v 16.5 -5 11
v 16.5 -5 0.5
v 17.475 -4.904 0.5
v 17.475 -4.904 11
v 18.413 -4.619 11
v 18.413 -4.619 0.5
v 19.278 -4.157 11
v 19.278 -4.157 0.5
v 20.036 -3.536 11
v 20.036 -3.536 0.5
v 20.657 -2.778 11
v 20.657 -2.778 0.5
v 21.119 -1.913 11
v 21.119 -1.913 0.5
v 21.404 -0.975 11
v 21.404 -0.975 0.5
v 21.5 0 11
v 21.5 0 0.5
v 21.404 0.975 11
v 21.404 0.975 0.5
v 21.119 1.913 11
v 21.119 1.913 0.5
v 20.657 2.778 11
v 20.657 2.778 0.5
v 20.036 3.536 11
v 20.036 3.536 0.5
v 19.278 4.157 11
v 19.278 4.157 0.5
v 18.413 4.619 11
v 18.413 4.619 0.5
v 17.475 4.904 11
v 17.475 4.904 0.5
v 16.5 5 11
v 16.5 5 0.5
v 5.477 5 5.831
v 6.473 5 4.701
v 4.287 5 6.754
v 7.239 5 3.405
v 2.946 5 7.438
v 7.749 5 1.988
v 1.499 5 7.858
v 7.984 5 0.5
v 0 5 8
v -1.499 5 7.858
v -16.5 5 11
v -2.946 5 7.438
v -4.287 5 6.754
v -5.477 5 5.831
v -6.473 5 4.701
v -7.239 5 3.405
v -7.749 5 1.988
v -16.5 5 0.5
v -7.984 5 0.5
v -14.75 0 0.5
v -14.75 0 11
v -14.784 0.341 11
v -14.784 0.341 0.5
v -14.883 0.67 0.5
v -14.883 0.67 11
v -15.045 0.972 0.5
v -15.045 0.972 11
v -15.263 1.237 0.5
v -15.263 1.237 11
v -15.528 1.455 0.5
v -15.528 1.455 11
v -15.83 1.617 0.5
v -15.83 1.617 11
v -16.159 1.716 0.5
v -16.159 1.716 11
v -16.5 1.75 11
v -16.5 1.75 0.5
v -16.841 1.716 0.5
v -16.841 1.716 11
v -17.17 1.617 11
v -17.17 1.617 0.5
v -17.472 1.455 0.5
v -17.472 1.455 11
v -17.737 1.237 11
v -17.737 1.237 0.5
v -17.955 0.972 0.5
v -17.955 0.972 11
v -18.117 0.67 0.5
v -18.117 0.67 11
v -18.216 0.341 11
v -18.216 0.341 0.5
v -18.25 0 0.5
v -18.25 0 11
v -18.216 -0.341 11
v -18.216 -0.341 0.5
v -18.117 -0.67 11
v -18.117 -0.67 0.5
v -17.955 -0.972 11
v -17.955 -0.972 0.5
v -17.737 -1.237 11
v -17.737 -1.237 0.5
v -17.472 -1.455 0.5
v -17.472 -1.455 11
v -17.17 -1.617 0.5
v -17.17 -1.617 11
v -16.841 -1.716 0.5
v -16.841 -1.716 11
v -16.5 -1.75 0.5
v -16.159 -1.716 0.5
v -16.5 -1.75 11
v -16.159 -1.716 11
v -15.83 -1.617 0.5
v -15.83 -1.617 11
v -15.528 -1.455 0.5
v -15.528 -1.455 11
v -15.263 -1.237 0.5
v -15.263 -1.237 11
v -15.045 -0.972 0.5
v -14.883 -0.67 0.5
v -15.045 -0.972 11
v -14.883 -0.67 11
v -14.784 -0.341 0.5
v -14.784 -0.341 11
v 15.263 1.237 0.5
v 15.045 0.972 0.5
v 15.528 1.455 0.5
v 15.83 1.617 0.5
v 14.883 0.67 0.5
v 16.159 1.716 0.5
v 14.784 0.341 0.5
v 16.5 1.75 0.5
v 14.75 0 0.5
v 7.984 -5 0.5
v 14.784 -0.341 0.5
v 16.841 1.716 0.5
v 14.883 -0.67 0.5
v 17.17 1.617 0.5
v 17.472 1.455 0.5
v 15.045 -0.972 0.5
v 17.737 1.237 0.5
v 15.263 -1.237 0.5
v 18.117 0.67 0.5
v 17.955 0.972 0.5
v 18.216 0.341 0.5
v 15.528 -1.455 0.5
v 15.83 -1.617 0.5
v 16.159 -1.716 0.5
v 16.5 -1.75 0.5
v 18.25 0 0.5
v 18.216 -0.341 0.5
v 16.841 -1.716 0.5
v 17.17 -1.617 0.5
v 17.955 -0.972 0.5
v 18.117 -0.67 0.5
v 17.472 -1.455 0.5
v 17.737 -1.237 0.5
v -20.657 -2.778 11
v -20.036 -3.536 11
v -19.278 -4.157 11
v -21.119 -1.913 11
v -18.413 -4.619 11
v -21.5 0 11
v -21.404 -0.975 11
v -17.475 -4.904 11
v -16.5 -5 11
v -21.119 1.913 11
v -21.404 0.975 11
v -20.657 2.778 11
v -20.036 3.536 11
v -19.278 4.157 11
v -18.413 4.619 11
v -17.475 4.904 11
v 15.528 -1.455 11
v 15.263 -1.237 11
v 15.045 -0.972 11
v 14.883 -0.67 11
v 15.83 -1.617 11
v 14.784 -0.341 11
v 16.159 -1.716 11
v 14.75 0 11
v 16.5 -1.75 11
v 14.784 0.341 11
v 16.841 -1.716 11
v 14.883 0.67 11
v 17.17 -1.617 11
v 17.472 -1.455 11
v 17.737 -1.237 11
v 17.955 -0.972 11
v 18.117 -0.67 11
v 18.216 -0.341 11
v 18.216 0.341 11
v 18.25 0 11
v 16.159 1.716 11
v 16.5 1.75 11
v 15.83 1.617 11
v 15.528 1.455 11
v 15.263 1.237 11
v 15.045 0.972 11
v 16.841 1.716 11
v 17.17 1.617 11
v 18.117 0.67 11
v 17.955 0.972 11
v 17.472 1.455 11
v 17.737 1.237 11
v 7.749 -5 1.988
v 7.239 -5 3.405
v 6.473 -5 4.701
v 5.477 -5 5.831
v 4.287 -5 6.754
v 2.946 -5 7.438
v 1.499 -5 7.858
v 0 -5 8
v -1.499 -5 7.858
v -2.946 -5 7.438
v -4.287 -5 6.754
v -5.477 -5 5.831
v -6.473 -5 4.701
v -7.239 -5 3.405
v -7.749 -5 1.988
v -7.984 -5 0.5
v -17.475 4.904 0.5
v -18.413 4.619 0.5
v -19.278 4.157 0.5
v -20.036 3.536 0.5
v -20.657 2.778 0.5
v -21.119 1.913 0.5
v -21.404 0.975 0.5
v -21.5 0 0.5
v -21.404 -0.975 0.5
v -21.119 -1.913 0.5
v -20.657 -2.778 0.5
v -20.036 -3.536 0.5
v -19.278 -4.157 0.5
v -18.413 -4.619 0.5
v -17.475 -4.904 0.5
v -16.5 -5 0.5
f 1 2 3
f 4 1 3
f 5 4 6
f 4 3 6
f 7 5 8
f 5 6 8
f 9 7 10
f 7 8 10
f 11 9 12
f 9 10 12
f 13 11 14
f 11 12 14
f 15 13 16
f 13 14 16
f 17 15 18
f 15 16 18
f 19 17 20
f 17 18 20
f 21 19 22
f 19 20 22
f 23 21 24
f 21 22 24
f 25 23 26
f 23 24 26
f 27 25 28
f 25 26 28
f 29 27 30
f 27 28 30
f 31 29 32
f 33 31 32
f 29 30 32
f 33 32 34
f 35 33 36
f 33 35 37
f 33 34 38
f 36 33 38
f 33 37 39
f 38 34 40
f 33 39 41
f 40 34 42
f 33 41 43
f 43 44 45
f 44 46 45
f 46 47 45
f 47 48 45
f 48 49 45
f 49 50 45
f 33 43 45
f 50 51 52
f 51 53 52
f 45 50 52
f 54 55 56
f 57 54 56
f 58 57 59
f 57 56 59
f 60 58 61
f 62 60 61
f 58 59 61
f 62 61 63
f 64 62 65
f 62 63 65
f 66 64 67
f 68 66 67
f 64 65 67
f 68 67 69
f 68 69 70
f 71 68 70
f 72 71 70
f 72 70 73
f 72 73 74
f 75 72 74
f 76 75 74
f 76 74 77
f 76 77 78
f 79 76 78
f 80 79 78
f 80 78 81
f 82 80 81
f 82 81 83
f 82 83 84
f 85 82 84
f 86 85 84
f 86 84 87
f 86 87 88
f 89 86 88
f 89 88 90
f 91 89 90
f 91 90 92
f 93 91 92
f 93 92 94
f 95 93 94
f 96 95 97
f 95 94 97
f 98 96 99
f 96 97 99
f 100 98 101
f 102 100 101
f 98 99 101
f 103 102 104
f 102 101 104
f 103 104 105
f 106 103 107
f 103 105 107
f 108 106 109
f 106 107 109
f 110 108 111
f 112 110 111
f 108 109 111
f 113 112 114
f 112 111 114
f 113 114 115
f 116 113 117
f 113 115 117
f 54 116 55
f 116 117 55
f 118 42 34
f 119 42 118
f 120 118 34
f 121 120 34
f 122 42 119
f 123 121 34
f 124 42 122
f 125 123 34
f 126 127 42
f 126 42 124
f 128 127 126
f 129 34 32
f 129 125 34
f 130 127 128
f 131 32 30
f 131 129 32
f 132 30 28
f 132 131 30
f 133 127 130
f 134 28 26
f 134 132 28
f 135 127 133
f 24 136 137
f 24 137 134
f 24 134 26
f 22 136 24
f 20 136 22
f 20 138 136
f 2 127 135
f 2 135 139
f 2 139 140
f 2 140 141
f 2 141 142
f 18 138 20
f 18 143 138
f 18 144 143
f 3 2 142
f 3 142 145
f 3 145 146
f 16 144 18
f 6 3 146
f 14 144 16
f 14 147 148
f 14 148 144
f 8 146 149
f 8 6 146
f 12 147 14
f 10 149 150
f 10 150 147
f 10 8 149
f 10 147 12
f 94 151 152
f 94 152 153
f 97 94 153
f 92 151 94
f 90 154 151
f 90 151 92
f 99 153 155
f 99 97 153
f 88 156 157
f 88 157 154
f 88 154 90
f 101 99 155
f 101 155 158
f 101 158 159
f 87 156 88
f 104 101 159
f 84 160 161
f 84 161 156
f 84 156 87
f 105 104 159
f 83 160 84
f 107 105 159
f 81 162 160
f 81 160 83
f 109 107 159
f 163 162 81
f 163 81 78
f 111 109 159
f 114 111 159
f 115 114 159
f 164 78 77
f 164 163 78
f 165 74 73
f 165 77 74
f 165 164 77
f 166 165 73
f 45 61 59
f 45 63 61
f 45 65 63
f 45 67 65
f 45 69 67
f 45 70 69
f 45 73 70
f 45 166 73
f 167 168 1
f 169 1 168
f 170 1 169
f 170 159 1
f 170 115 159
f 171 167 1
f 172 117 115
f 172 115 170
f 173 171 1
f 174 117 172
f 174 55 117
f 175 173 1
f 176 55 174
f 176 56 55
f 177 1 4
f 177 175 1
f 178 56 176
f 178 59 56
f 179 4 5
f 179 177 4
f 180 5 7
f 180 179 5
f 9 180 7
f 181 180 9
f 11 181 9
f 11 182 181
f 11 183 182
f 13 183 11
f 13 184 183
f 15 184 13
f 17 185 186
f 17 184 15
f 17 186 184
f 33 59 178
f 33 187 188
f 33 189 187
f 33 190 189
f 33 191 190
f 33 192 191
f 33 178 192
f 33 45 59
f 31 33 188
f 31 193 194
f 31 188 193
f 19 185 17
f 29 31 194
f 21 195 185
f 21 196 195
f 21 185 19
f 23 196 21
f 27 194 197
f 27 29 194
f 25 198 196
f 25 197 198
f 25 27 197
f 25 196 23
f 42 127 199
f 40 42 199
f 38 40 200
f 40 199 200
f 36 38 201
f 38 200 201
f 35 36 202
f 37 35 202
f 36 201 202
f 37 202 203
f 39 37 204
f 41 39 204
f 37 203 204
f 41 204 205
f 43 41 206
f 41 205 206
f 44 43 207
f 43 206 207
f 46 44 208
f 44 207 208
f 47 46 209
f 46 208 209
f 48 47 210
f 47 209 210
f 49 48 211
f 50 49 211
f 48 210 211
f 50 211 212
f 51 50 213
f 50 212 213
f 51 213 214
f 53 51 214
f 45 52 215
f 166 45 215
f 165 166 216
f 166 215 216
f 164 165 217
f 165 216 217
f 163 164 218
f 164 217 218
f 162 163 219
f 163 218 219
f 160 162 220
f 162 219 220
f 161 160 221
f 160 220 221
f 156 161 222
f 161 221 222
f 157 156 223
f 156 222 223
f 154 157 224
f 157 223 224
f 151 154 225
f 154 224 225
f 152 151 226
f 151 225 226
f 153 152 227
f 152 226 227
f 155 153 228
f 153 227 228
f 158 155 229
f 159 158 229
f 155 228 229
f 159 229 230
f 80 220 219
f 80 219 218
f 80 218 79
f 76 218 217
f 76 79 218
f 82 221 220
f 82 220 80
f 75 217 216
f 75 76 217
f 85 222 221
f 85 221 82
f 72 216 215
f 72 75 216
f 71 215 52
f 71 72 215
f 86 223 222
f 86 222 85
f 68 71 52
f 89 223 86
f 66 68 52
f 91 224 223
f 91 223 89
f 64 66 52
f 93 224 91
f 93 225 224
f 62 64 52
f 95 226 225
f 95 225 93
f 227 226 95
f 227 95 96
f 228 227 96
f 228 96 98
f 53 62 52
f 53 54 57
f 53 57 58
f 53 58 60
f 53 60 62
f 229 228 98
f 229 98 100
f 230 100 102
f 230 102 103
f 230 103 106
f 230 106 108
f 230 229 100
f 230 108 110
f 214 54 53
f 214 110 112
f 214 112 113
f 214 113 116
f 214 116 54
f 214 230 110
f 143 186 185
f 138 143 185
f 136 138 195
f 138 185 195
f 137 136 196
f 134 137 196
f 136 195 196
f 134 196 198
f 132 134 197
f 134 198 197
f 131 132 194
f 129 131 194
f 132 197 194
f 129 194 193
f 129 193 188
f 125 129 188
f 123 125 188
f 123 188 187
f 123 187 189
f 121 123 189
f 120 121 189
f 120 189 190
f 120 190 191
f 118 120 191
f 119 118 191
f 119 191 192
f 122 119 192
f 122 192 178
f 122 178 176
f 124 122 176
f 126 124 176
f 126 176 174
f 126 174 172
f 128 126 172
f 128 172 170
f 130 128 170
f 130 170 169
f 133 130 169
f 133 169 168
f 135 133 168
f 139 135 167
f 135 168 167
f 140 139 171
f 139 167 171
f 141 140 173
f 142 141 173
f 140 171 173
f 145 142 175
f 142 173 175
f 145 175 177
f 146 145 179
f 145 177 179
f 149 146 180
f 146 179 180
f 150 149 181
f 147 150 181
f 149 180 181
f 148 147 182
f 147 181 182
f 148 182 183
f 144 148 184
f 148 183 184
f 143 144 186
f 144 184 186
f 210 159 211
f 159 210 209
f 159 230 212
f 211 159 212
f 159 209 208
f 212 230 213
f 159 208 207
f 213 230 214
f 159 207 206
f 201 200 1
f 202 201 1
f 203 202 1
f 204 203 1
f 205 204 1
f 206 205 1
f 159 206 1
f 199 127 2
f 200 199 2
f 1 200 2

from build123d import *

# Parameters (mm, degrees)
F1_DEPTH = 11
F3_DEPTH = 12.5
F4_R     = 1.75
F5_DEPTH = 25
F6_W     = 45
F6_H     = 1
F7_DEPTH = 12.5


with BuildPart() as f1:
    # F0 (on Top) → F1 (new body)
    with BuildSketch(Plane.XY):
        with BuildLine():
            Line((16.5, 5), (-16.5, 5))
            ThreePointArc((-16.5, 5), (-21.5, 0), (-16.5, -5))
            Line((-16.5, -5), (16.5, -5))
            ThreePointArc((16.5, -5), (21.5, 0), (16.5, 5))
        make_face()
    extrude(amount=F1_DEPTH)

    # F2 (on Front) → F3 (cut, symmetric)
    with BuildSketch(Plane.XZ):
        with BuildLine():
            Line((-8, 0), (8, 0))
            ThreePointArc((8, 0), (0, 8), (-8, 0))
        make_face()
    extrude(amount=F3_DEPTH, both=True, mode=Mode.SUBTRACT)

    # F4 (on face) → F5 (cut)
    with BuildSketch(Plane.XY.offset(11)):
        with Locations((-16.5, 0)):
            Circle(F4_R)
        with Locations((16.5, 0)):
            Circle(F4_R)
    extrude(amount=-F5_DEPTH, mode=Mode.SUBTRACT)

    # F6 (on Front) → F7 (cut, symmetric)
    with BuildSketch(Plane.XZ):
        Rectangle(F6_W, F6_H)
    extrude(amount=F7_DEPTH, both=True, mode=Mode.SUBTRACT)


solid = f1.part
